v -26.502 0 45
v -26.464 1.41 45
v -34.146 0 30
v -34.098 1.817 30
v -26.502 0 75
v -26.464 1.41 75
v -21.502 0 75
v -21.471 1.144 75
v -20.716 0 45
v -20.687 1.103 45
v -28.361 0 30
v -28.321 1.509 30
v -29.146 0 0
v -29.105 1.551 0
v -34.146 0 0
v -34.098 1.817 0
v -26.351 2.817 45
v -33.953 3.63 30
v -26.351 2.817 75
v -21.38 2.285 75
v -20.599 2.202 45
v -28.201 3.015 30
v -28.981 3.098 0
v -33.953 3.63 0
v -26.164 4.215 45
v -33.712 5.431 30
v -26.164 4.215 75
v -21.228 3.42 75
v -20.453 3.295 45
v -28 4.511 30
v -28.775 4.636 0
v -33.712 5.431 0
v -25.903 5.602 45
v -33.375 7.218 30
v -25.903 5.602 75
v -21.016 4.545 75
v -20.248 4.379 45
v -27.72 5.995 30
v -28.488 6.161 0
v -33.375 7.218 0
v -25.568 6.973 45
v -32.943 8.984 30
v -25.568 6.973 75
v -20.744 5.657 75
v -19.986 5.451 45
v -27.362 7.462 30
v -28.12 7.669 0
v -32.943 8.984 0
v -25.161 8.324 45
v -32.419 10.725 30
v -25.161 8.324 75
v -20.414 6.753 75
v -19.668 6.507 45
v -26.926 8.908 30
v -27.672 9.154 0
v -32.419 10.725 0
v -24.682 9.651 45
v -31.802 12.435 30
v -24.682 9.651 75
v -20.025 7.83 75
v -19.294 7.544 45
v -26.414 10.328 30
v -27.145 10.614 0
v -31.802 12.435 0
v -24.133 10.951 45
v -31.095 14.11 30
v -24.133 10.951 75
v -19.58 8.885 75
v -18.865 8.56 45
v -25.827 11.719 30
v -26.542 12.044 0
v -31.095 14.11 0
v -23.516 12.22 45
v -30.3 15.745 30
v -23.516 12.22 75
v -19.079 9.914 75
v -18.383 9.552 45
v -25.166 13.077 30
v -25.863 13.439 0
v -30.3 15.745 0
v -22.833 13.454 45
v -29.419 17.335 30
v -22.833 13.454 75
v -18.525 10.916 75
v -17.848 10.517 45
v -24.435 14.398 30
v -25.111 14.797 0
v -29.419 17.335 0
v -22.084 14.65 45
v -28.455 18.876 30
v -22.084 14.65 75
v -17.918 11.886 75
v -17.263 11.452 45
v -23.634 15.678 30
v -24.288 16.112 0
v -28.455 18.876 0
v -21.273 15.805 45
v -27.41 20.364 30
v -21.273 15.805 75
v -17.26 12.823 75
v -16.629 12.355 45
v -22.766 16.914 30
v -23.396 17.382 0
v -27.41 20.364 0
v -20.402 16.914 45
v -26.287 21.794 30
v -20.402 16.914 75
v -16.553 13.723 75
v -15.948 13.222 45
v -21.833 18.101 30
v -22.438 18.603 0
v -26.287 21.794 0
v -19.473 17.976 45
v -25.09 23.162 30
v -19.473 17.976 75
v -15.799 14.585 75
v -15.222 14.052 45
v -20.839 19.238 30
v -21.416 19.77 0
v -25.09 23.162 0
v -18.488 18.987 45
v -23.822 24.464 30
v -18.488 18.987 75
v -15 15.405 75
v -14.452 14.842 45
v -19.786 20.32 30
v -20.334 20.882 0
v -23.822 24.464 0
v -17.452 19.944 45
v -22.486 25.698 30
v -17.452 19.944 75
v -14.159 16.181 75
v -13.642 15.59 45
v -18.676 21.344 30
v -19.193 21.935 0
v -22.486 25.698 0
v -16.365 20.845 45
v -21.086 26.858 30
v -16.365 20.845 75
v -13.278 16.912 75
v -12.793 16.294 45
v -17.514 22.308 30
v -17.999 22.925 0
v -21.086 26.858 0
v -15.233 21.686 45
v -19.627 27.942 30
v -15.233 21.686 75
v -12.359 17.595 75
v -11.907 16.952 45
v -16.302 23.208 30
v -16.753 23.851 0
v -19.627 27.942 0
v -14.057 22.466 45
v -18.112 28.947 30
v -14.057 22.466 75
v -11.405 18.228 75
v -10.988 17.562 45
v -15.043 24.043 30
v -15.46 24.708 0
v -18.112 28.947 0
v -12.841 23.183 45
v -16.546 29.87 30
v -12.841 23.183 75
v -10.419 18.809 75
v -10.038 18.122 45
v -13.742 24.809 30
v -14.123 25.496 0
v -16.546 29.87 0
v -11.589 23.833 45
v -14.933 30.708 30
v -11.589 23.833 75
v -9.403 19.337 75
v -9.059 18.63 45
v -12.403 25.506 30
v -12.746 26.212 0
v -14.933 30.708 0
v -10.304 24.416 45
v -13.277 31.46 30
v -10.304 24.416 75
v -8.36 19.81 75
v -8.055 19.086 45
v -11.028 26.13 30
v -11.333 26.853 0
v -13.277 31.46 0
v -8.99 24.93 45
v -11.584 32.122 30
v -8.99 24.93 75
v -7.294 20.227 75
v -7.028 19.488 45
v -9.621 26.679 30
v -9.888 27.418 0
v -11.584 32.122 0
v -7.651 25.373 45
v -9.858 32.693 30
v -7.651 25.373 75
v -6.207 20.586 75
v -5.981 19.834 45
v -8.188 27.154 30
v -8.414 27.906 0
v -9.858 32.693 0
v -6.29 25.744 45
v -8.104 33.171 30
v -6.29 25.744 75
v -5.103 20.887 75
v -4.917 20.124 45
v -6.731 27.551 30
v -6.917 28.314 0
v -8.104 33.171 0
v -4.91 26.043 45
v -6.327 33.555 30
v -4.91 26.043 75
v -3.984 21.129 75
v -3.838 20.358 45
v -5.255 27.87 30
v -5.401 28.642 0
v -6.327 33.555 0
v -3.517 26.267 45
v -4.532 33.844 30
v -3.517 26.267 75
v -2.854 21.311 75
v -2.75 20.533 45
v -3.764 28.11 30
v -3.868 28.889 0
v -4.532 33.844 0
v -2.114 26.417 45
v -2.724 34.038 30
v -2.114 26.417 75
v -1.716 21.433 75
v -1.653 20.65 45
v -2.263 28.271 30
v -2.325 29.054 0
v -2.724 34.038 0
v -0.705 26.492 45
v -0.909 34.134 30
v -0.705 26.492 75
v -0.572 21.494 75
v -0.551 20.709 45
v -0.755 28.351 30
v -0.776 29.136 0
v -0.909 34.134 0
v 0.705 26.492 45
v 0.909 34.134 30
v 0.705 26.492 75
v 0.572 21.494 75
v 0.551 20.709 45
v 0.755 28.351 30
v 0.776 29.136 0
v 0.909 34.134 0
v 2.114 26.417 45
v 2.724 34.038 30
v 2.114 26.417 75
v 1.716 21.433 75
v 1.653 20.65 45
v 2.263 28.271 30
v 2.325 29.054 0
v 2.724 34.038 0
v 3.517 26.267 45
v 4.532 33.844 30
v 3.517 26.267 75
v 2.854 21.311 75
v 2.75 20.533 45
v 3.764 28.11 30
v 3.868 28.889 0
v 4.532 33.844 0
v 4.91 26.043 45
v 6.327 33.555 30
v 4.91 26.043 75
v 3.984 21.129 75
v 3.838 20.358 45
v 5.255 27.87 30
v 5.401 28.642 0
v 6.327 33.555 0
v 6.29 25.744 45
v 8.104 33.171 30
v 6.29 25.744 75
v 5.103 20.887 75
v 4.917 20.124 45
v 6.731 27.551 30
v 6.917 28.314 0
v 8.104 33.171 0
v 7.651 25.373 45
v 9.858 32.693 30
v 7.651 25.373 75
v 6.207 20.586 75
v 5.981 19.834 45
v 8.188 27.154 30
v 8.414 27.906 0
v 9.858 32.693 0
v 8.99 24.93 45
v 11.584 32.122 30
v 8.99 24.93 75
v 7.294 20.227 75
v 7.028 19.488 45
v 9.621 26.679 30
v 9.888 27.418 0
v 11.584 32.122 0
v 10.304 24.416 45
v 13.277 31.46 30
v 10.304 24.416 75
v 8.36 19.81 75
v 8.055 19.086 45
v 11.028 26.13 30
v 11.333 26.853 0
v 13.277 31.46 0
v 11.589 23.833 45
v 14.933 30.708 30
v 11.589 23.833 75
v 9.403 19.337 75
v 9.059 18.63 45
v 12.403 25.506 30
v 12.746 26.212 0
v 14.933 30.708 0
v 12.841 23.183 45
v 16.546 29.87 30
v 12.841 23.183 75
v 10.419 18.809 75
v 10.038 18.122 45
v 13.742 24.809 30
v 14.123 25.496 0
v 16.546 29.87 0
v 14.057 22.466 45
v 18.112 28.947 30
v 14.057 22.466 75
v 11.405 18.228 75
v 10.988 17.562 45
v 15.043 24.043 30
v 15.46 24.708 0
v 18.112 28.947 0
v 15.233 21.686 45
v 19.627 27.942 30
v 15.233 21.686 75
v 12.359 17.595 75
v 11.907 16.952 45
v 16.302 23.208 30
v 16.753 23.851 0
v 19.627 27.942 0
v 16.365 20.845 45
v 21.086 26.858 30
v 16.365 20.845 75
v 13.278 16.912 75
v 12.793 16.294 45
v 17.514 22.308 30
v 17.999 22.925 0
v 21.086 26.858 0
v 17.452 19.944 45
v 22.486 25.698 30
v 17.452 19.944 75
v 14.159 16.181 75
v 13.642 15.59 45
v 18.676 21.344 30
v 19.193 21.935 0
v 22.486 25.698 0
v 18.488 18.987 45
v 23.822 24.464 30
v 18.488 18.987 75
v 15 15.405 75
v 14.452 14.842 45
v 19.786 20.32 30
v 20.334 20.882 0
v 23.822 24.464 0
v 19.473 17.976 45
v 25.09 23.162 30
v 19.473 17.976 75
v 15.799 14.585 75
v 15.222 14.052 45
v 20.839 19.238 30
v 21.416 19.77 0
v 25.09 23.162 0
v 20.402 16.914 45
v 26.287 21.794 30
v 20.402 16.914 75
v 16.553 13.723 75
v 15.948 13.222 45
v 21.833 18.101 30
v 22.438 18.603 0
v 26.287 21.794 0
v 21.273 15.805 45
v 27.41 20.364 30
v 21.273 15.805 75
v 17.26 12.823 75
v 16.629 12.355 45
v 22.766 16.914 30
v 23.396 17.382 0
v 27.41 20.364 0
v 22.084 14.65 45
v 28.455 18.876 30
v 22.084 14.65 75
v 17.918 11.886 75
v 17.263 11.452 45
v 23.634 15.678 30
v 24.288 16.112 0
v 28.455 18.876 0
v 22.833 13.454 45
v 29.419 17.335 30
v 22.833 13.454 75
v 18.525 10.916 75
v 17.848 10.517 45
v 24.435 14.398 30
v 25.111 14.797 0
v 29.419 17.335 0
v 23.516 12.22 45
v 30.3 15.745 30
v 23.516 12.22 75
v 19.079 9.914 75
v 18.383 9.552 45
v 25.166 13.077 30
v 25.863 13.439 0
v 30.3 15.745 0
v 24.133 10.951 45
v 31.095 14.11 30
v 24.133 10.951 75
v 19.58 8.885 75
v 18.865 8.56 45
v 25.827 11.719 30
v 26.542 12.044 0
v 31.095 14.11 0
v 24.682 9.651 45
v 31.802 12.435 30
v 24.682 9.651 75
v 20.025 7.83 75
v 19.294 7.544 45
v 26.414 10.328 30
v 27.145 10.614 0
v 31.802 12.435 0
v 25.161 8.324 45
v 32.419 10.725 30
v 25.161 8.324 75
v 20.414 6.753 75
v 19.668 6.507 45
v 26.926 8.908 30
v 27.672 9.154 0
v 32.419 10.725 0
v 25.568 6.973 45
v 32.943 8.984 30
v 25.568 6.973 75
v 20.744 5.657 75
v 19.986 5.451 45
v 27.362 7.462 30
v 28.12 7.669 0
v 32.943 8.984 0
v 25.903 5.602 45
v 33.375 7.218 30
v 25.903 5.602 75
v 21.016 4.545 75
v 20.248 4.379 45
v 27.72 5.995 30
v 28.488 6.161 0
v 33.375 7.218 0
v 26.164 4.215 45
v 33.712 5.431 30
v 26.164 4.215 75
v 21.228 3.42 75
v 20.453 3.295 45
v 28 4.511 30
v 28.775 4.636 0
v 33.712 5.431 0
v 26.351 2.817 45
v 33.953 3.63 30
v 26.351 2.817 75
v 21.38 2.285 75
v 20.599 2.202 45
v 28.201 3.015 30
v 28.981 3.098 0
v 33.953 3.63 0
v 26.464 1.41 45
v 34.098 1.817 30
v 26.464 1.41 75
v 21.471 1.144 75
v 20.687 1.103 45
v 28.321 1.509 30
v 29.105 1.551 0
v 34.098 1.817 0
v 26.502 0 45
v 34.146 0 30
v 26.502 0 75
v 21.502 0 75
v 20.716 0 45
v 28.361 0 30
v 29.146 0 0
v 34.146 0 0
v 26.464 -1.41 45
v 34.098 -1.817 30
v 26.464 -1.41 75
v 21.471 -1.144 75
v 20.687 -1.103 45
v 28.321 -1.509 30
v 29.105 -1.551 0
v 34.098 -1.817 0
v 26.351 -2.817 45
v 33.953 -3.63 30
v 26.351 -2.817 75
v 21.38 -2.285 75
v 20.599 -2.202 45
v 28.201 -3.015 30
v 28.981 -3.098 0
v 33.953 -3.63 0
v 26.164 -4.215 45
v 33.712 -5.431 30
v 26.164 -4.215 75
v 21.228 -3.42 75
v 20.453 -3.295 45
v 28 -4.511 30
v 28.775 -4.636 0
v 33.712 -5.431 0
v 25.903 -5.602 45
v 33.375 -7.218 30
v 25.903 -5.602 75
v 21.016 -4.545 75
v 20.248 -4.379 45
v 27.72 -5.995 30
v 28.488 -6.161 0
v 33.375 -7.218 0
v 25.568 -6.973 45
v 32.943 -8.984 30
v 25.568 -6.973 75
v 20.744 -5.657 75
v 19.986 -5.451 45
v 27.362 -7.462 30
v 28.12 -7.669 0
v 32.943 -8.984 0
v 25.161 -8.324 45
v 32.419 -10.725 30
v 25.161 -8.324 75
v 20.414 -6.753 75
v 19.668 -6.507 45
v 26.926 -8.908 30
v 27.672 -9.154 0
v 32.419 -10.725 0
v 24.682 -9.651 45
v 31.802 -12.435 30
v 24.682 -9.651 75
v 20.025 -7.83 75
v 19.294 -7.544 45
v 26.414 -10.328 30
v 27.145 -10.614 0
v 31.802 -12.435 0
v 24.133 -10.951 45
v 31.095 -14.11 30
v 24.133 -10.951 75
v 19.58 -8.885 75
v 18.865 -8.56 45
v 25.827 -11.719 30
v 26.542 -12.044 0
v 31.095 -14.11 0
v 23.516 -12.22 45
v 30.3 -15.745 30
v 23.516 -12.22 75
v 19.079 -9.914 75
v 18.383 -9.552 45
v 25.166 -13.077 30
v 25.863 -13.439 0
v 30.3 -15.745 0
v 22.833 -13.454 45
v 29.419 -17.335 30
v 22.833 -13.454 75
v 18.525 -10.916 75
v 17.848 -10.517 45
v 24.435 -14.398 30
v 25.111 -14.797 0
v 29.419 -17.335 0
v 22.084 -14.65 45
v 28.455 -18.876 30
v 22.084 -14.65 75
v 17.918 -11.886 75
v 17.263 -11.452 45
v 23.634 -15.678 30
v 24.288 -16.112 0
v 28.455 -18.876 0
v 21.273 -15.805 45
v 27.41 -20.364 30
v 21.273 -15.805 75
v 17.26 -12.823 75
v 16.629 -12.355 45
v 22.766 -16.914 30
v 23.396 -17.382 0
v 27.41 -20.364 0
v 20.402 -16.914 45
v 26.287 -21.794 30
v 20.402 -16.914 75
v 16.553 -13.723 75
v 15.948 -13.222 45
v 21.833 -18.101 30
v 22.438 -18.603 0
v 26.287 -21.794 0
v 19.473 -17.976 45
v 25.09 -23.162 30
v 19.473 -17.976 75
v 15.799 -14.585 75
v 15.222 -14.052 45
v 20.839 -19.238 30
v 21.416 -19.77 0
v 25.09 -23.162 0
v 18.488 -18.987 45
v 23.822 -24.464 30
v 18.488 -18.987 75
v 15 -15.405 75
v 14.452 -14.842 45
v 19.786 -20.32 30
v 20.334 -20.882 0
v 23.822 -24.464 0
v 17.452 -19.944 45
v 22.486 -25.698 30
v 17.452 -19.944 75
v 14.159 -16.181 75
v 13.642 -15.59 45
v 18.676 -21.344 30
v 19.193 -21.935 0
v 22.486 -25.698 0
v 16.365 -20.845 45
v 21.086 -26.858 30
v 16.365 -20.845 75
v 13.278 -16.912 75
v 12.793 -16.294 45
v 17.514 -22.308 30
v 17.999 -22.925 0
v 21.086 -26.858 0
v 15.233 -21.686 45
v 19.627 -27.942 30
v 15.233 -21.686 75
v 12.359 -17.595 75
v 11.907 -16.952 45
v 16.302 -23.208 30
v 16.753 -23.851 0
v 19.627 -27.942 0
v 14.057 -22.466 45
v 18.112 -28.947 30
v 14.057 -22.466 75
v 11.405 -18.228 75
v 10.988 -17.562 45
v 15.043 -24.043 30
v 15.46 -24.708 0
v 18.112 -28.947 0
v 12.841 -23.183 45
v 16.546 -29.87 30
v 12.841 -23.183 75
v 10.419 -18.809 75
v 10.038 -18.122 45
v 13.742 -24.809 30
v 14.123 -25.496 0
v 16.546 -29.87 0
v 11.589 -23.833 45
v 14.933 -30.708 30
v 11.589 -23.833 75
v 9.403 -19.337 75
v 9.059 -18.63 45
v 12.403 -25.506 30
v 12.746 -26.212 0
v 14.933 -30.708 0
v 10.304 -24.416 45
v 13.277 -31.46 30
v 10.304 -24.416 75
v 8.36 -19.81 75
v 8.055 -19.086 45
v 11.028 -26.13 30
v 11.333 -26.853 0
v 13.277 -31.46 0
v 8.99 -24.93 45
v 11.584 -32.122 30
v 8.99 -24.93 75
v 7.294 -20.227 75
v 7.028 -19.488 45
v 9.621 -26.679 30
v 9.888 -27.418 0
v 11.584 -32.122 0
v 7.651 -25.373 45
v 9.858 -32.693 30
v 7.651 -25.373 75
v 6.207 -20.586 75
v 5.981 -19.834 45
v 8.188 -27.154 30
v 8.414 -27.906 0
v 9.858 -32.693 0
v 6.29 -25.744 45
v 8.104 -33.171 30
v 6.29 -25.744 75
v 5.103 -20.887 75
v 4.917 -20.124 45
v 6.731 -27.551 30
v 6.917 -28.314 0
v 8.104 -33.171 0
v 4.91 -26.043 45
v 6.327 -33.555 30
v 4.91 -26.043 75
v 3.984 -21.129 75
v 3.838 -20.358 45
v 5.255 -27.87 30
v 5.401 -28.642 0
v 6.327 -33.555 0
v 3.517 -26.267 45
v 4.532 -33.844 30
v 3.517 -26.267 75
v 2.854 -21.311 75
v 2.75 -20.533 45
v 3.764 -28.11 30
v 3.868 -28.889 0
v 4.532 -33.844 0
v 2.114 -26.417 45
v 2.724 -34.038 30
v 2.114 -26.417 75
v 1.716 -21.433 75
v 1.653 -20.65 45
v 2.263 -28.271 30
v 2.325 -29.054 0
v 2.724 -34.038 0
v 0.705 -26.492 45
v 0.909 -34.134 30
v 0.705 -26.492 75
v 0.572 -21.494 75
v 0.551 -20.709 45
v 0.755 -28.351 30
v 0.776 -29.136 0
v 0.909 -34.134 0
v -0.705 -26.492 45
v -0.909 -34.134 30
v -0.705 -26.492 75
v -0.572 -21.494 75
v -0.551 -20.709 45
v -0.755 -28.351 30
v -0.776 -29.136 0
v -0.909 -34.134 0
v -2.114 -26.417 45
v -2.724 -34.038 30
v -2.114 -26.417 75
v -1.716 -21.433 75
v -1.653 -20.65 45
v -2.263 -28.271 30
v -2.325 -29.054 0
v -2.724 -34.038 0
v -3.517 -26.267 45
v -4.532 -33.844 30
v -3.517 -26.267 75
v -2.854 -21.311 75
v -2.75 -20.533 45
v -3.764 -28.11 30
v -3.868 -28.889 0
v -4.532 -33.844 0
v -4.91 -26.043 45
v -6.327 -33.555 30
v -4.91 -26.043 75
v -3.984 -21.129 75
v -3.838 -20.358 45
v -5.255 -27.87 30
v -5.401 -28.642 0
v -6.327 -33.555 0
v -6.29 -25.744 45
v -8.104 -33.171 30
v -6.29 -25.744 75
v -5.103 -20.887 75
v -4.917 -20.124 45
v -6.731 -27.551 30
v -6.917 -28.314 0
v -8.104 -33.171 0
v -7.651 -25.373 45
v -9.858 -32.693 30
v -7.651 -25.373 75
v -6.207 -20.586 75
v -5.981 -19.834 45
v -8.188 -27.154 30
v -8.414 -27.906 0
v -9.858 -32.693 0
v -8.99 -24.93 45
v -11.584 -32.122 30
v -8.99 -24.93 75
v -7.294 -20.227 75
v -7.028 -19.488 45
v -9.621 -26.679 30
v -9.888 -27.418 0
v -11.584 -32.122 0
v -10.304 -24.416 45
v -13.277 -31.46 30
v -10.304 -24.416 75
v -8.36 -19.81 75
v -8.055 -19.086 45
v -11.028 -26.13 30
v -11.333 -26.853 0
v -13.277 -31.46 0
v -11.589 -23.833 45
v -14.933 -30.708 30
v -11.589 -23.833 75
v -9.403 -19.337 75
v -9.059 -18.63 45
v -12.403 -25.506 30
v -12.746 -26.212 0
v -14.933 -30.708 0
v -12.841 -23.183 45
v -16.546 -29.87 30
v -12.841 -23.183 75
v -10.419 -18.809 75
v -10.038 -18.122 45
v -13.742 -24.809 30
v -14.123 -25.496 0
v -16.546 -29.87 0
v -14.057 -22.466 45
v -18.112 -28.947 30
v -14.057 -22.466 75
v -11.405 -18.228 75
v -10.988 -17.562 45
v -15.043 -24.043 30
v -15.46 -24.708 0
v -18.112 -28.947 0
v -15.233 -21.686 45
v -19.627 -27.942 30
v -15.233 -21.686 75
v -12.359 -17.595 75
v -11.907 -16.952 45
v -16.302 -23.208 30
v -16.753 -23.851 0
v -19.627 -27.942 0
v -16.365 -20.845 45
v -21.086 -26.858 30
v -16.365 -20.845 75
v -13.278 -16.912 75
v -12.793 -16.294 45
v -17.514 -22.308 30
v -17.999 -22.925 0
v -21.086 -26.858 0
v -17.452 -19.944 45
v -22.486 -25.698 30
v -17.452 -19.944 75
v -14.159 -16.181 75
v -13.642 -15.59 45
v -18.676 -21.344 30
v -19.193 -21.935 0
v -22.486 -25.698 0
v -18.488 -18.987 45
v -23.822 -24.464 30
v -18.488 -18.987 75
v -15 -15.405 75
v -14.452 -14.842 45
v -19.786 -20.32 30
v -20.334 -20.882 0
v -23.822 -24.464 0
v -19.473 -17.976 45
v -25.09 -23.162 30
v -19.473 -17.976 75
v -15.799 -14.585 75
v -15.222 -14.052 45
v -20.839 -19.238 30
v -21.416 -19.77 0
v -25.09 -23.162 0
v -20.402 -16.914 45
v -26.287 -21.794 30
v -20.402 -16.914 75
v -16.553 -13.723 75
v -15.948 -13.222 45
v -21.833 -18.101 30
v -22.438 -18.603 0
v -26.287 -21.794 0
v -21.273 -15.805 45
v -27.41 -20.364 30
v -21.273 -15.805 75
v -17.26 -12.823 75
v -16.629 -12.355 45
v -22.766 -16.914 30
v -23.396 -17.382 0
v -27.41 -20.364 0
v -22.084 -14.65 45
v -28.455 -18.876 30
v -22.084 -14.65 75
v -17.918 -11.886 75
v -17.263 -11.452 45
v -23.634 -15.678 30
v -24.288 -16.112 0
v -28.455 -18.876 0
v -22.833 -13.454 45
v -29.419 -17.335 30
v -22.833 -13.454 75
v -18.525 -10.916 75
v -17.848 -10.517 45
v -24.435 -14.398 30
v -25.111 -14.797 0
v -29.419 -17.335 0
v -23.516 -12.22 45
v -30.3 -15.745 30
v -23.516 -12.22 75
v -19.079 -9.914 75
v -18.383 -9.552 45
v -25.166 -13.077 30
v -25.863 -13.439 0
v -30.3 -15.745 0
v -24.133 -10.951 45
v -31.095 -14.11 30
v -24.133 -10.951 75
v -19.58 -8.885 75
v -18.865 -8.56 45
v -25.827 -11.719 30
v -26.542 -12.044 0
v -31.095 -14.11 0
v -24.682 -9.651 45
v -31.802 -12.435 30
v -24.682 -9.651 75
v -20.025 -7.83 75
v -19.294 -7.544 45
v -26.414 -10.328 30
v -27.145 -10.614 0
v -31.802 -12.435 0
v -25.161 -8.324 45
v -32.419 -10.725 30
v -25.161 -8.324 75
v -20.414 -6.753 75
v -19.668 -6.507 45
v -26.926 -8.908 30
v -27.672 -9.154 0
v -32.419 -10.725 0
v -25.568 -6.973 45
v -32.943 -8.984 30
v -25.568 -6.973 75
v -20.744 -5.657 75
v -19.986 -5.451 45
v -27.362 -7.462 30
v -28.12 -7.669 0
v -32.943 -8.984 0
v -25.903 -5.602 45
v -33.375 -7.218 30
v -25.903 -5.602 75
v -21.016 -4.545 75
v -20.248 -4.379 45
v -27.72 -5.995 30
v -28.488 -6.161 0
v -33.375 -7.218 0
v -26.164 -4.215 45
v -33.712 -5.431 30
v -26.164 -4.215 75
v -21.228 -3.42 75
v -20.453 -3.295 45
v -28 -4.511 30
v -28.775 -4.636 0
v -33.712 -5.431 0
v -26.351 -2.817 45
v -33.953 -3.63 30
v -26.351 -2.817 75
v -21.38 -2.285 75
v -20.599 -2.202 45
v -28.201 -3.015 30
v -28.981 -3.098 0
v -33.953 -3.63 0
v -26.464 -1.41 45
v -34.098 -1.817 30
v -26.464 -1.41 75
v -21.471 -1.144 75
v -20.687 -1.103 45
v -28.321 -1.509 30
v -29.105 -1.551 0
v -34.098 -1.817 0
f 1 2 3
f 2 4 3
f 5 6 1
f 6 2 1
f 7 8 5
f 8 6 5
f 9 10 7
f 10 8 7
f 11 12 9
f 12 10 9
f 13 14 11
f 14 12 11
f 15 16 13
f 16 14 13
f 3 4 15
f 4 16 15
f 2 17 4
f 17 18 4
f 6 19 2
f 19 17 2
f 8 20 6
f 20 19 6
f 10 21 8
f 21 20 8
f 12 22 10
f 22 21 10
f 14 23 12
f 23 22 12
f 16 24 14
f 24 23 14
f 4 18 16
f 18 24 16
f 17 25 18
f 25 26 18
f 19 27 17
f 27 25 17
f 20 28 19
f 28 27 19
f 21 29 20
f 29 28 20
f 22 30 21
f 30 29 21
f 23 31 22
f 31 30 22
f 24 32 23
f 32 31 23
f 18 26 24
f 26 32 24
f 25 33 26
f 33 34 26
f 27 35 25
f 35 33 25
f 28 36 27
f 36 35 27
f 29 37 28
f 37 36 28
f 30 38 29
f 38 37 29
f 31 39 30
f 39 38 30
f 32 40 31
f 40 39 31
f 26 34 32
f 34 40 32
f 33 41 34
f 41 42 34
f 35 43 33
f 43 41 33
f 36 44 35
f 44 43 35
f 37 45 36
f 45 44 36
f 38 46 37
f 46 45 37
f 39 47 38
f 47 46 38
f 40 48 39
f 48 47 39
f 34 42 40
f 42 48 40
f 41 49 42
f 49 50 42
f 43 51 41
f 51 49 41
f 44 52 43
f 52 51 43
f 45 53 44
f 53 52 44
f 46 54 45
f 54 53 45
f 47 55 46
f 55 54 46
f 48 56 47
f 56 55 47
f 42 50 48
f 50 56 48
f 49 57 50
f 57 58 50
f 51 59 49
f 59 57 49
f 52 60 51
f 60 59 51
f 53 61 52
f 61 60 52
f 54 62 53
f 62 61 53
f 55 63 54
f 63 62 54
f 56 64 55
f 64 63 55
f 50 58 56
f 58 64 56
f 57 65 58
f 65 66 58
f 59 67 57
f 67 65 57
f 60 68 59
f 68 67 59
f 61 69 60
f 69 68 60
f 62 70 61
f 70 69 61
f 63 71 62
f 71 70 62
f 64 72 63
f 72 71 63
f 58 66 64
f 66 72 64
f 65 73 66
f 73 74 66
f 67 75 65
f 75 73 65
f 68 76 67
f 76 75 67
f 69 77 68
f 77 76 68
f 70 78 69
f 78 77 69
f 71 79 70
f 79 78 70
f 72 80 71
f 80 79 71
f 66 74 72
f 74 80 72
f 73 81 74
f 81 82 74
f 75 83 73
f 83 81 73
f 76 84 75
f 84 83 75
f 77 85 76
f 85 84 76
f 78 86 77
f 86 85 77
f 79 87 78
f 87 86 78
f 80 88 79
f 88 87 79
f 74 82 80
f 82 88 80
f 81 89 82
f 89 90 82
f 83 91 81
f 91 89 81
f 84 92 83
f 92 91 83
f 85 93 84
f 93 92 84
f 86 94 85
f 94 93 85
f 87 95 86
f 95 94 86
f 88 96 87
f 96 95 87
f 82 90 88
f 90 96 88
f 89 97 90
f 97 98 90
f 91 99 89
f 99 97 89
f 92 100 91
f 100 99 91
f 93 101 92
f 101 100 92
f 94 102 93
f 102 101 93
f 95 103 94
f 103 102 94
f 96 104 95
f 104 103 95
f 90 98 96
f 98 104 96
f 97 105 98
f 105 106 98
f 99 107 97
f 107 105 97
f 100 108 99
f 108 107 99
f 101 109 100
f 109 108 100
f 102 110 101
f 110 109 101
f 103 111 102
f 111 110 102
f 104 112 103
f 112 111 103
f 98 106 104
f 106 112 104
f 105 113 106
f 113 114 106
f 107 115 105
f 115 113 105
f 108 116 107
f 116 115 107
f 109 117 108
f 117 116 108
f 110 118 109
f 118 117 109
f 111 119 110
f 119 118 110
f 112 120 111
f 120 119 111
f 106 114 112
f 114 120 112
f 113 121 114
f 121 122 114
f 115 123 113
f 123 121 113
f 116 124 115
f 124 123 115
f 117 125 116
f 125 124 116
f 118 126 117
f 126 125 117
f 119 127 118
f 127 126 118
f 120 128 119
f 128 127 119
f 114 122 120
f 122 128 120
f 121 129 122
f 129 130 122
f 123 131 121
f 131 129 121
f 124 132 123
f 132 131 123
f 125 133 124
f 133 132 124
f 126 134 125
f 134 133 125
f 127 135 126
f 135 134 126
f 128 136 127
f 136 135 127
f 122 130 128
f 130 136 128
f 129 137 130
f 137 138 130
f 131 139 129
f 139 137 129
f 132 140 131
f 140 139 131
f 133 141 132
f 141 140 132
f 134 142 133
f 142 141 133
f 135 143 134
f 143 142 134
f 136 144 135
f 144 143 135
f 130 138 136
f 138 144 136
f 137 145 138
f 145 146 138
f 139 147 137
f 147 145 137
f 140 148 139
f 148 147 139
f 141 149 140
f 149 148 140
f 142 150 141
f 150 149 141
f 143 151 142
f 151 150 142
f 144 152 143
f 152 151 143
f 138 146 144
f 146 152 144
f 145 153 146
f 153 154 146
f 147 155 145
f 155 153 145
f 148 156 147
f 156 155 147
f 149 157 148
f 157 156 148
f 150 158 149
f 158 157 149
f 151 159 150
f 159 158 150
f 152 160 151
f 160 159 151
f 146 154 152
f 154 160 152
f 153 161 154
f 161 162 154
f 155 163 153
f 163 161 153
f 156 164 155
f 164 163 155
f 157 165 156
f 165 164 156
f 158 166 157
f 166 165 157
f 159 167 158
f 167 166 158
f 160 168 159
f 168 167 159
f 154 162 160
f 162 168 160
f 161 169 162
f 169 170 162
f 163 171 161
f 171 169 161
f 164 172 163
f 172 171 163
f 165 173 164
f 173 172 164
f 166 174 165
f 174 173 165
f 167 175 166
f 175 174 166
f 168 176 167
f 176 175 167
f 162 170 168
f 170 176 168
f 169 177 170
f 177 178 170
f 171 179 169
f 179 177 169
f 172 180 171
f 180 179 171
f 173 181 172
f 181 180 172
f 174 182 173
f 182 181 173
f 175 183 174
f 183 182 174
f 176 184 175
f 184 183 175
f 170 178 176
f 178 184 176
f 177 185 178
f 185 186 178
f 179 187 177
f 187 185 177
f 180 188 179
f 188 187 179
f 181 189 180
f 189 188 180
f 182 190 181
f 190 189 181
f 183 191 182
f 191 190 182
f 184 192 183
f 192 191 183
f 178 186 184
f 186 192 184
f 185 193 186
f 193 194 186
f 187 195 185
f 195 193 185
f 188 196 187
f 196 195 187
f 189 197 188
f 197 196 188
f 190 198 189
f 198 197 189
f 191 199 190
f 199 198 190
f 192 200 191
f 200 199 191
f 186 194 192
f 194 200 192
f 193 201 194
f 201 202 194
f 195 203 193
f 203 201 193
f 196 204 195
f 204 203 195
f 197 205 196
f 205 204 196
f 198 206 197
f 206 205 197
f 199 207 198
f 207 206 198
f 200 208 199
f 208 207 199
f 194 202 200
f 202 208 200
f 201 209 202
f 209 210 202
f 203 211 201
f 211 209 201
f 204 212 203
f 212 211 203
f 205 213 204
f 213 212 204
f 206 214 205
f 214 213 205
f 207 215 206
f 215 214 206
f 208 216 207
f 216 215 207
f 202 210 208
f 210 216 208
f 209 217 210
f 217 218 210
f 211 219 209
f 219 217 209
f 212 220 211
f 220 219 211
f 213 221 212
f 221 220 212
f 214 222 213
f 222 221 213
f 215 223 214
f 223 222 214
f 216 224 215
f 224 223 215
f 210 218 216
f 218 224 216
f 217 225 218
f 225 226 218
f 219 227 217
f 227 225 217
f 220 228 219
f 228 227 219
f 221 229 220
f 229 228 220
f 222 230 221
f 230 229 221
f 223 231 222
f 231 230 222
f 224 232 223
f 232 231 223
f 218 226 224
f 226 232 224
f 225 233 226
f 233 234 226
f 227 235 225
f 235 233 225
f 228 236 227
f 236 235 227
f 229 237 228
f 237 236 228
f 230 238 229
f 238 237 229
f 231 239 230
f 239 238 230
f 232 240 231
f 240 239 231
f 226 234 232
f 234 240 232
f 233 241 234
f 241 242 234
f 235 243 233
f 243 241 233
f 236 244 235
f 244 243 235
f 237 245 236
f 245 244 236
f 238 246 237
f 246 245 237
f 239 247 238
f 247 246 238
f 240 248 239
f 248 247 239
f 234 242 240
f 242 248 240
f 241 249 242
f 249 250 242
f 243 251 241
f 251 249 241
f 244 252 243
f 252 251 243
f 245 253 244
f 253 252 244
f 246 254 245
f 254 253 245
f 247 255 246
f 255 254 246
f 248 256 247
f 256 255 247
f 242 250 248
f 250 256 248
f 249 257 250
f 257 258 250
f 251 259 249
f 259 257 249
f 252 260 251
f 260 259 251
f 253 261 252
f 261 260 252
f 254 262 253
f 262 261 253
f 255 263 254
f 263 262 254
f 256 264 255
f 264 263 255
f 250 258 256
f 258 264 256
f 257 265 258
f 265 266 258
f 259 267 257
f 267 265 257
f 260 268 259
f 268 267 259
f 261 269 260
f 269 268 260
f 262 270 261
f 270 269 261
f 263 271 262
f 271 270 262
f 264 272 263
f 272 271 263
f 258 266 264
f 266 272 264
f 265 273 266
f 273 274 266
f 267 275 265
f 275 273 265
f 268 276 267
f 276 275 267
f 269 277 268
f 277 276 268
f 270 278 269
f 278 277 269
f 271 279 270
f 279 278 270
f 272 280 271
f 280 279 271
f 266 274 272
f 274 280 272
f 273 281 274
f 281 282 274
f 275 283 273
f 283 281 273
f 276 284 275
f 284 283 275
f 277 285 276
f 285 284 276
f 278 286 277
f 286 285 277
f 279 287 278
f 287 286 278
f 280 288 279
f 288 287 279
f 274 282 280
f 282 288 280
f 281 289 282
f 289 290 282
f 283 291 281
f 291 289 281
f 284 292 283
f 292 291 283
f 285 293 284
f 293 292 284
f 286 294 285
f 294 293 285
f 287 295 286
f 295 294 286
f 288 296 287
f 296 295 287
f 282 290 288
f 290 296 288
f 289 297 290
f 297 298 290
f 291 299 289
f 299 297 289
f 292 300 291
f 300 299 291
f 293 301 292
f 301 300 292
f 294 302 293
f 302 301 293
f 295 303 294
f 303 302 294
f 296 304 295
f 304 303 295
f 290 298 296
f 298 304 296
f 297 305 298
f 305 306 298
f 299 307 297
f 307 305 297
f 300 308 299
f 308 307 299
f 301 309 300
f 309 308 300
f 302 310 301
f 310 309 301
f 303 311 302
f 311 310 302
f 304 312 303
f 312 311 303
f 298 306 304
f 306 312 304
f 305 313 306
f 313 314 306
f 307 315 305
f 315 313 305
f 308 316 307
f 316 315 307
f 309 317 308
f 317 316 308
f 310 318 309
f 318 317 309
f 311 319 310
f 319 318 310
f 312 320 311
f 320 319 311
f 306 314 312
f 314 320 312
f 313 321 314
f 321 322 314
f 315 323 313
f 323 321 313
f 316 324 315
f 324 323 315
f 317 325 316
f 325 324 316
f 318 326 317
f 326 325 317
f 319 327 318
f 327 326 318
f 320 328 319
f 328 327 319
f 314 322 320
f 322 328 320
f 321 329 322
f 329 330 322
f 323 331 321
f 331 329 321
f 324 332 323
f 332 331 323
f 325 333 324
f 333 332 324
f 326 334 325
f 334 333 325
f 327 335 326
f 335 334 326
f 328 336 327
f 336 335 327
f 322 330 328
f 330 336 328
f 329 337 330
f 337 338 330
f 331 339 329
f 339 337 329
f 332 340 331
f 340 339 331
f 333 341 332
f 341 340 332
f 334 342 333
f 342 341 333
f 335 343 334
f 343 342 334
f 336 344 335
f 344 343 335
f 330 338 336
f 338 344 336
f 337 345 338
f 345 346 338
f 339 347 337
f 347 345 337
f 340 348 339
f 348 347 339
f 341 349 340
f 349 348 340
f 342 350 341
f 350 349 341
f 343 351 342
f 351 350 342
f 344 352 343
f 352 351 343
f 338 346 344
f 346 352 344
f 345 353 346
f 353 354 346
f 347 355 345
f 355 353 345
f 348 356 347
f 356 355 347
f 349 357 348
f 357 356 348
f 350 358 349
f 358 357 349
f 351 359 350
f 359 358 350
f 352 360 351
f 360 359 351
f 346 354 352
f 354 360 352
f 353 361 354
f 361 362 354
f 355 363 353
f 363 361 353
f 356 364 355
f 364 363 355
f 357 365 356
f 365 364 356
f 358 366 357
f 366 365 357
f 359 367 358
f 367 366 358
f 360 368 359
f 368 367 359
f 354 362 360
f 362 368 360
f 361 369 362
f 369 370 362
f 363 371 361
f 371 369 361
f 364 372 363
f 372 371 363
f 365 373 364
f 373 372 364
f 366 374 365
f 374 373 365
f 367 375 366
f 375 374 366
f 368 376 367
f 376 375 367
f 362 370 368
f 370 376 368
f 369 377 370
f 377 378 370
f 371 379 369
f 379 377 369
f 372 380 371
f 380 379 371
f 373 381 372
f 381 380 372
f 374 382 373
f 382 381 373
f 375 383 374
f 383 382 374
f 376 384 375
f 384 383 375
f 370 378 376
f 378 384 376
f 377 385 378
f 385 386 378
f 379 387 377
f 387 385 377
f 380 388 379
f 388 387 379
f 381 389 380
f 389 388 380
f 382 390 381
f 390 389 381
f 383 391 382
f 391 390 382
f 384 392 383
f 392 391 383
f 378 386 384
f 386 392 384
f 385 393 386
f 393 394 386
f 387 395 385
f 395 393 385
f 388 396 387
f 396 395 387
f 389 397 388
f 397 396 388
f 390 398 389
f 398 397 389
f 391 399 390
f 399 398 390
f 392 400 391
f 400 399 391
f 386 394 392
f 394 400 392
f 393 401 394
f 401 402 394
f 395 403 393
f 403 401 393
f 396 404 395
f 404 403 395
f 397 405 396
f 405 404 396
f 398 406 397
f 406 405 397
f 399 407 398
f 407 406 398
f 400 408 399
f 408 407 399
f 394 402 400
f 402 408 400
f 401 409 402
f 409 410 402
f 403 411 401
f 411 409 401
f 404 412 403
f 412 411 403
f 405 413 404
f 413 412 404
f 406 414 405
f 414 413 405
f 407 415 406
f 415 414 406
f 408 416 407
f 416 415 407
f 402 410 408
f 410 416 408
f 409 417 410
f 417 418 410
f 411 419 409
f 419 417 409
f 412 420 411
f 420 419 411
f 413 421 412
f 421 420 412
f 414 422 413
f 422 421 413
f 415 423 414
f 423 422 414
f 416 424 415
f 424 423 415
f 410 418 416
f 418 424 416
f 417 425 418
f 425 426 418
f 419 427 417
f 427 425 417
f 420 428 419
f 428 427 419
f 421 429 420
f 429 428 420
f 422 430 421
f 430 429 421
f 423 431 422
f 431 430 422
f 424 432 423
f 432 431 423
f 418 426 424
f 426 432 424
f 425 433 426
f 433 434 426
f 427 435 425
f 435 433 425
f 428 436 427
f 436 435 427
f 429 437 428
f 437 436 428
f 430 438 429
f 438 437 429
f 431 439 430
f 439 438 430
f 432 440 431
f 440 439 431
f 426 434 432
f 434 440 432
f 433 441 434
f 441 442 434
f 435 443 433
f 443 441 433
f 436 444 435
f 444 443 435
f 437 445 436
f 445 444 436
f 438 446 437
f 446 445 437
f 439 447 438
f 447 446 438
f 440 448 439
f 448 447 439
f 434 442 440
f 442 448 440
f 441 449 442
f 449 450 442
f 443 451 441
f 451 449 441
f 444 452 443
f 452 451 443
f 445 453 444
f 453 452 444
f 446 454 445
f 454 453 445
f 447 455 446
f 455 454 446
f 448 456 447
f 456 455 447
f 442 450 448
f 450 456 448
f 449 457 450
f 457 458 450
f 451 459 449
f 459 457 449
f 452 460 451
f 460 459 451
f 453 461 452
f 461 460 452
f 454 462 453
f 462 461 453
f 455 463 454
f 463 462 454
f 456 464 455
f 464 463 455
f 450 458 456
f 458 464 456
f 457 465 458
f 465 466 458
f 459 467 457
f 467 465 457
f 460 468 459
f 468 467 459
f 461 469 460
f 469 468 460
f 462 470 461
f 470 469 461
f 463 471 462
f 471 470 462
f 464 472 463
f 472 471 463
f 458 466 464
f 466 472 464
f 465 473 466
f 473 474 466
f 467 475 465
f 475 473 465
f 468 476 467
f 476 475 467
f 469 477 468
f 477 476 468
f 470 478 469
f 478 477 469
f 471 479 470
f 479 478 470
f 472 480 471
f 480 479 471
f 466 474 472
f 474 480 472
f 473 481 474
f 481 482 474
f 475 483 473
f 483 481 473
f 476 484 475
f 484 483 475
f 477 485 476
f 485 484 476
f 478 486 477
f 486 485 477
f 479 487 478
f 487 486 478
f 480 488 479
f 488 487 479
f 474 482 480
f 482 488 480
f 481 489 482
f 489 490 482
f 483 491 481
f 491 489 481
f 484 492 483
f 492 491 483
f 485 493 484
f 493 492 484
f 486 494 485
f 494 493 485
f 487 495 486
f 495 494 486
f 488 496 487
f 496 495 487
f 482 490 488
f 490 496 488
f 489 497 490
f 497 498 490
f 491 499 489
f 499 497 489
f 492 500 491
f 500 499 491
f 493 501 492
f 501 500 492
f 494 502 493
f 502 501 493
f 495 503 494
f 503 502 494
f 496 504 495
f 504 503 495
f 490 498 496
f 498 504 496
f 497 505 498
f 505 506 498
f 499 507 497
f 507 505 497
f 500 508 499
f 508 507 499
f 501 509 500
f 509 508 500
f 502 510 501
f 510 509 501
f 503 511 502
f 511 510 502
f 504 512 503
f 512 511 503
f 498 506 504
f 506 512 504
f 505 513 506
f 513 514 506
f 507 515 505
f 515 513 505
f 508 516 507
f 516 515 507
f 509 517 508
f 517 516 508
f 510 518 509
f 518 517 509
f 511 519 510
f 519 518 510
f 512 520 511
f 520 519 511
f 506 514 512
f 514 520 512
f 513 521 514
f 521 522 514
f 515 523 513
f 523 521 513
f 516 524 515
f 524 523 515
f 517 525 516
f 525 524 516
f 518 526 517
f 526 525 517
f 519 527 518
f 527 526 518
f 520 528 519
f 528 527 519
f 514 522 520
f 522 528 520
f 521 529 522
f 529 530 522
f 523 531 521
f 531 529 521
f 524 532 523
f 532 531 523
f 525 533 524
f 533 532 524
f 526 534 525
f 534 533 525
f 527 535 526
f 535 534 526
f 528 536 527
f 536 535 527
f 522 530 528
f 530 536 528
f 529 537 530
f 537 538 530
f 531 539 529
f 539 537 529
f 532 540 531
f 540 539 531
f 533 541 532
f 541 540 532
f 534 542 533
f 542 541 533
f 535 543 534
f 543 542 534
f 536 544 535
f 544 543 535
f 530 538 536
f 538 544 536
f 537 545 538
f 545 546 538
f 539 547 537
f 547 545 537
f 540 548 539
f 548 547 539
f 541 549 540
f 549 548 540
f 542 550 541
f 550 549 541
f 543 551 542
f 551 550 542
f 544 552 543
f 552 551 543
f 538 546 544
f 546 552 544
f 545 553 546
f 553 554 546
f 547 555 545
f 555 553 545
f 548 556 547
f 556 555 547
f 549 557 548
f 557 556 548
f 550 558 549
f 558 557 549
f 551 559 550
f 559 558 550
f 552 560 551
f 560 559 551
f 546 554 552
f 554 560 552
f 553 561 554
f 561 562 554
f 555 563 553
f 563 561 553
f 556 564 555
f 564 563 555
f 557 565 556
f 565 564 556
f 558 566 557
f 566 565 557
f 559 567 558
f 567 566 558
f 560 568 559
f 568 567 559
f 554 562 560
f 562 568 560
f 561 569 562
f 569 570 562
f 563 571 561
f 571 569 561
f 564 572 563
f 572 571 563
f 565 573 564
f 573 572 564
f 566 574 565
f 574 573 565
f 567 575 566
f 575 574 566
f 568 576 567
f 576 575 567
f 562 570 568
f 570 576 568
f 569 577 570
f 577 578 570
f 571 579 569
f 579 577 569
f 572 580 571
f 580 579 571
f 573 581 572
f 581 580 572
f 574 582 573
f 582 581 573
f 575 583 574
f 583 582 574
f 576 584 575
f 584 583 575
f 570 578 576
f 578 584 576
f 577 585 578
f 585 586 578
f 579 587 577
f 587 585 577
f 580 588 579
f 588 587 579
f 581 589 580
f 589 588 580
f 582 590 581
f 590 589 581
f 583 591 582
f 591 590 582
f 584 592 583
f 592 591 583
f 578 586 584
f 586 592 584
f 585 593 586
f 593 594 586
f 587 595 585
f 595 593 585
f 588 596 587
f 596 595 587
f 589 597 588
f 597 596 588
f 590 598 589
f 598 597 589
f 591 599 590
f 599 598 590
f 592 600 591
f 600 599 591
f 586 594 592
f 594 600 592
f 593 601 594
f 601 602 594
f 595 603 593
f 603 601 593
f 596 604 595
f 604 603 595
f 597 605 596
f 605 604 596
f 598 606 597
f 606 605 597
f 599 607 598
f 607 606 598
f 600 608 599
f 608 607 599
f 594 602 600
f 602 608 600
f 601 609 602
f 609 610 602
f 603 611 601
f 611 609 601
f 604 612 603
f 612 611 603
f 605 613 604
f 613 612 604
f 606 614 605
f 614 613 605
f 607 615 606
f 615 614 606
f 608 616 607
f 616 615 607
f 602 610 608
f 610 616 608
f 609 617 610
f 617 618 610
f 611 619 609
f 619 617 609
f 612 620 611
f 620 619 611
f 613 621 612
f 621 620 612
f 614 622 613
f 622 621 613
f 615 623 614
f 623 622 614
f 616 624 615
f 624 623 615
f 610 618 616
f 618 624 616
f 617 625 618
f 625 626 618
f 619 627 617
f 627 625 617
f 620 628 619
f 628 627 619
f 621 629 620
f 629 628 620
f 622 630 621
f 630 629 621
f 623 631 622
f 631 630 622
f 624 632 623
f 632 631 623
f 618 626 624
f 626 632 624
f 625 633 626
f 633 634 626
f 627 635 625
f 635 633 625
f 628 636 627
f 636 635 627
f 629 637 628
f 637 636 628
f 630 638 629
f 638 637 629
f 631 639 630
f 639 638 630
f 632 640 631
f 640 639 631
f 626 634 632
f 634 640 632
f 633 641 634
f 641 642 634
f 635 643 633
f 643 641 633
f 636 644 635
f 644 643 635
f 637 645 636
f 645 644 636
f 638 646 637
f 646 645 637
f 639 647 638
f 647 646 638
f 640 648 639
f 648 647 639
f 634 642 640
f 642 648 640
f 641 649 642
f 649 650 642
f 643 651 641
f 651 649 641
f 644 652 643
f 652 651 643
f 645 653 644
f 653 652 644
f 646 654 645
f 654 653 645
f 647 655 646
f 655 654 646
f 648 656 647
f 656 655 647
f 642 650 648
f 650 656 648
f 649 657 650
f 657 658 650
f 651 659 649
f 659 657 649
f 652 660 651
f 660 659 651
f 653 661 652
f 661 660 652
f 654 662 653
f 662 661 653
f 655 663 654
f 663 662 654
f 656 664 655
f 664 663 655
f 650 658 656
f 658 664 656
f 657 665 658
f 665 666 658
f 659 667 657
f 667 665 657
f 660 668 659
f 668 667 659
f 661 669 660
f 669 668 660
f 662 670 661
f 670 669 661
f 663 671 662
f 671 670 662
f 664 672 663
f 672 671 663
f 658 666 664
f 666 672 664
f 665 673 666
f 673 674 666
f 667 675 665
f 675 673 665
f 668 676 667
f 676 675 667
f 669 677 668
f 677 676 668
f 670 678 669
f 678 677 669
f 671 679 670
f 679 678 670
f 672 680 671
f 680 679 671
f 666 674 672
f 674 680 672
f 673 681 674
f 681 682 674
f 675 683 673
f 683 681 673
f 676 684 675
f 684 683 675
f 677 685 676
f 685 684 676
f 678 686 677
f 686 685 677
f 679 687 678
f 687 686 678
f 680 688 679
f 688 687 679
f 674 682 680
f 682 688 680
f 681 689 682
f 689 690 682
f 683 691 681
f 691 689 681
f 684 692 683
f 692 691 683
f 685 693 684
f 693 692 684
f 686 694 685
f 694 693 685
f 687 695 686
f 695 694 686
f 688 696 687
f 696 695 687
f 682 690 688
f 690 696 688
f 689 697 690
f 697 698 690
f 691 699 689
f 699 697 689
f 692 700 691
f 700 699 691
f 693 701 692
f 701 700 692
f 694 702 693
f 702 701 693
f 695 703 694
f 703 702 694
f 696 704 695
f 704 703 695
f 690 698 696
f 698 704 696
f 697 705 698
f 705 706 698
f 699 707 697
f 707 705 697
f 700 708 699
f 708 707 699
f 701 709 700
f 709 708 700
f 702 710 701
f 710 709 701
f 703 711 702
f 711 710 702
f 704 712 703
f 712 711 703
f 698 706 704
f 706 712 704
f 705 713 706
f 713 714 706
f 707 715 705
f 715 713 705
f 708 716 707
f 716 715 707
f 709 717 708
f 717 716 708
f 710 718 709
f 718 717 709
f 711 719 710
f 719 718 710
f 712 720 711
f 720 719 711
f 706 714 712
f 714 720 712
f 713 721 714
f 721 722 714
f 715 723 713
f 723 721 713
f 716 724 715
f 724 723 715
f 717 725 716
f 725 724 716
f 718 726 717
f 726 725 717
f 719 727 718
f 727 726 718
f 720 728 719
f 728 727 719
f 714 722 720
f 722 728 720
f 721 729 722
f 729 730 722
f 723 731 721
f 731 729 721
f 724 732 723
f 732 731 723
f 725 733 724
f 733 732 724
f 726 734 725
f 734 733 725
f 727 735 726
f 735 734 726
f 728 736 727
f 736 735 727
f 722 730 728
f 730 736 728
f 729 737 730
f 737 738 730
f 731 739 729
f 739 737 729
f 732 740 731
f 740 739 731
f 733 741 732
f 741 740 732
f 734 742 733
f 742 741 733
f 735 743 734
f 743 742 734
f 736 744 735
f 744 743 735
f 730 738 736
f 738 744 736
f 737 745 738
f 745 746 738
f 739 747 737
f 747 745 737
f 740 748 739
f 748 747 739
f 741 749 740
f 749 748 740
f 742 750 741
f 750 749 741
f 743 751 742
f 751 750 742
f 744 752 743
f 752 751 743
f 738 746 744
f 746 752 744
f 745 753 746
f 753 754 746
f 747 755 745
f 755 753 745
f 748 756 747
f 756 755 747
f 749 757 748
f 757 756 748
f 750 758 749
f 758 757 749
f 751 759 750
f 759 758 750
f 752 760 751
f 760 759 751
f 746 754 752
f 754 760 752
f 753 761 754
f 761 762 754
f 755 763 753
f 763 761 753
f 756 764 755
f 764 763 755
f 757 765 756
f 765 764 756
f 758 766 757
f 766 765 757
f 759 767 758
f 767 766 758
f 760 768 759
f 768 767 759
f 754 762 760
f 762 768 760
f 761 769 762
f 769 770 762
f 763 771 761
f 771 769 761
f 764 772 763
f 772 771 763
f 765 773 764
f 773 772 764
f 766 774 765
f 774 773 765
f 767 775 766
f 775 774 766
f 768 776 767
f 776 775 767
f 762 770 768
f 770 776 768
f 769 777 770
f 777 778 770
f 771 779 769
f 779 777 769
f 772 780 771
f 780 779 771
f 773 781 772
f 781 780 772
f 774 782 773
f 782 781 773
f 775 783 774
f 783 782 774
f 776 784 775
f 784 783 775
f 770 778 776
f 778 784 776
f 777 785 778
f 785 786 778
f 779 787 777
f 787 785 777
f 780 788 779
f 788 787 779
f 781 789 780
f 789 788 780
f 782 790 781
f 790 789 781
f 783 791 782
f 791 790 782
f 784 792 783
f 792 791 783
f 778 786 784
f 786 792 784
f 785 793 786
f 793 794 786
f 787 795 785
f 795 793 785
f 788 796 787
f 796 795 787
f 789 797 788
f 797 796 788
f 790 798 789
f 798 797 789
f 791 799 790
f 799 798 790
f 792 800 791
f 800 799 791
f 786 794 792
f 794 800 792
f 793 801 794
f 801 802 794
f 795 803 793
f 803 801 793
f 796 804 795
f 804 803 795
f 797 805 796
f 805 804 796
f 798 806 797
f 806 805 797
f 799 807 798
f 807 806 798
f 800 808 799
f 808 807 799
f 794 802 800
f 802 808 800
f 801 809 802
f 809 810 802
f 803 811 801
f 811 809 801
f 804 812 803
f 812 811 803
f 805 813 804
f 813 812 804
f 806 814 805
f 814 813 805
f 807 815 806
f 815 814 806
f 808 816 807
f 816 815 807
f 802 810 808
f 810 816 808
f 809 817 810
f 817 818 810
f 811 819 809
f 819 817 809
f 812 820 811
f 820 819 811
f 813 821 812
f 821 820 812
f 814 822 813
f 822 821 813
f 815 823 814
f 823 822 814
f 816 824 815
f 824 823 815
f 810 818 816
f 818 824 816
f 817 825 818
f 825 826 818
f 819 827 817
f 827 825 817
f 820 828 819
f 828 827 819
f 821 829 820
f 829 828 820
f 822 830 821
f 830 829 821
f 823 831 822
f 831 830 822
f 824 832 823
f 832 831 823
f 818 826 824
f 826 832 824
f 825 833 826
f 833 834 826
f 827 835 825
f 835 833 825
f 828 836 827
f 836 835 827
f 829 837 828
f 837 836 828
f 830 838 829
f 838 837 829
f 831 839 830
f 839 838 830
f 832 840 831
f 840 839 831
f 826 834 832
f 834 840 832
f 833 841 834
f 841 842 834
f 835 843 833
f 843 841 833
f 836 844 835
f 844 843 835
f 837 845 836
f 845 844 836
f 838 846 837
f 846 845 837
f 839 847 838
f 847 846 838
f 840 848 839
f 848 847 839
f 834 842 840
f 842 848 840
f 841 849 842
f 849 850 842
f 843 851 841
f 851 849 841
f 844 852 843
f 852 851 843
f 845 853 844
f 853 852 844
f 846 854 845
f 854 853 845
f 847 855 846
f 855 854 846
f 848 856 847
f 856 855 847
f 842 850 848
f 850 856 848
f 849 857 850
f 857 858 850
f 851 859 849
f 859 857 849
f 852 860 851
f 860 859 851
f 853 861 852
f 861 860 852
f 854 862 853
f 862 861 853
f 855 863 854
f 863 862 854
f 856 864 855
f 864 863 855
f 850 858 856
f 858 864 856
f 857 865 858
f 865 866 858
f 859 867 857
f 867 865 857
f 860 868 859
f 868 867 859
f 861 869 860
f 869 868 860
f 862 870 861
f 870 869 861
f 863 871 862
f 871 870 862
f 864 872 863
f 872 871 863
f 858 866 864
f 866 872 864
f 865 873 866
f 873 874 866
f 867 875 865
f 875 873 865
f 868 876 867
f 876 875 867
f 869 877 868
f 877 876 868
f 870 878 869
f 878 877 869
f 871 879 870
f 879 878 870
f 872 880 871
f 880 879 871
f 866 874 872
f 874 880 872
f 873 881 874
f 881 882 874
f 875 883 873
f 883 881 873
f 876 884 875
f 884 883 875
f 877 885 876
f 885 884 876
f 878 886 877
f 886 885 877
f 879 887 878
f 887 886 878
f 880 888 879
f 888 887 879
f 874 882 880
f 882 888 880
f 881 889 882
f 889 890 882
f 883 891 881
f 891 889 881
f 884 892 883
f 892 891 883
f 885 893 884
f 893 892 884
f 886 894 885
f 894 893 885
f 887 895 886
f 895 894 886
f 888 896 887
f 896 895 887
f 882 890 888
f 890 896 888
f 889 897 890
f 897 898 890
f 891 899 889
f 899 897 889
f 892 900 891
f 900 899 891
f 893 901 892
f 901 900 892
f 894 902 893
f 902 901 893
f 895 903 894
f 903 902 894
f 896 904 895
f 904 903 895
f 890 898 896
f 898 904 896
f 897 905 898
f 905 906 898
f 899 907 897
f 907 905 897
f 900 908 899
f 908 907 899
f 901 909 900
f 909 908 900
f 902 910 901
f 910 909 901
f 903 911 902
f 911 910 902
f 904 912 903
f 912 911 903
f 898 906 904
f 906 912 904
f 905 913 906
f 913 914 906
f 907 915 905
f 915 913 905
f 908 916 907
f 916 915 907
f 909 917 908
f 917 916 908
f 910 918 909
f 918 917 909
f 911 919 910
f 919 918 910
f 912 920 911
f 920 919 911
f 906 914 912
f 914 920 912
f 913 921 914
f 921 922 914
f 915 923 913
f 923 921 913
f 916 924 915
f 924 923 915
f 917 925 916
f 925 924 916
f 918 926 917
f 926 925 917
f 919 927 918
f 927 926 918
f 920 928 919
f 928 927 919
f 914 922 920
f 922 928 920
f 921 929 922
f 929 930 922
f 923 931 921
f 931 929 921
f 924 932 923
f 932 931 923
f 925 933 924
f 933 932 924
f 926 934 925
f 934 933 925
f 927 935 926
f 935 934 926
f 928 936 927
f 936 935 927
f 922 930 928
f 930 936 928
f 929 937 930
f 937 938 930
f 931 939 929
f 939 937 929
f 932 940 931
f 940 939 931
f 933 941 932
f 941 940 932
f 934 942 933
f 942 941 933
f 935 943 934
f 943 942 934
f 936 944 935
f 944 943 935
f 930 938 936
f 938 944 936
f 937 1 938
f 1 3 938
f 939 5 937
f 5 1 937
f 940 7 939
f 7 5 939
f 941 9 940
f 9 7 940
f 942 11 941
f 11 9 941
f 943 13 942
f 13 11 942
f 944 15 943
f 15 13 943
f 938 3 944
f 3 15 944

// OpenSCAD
//------------------------------------------------------------------
/*

Adapters for connecting a tool to a dust collector.

*/
//------------------------------------------------------------------
// Basic parameters

// Note: The adapter fits around the outside diameter of the pipes on the
// tool and the vaccuum.

// Specify the outside diameter of the pipes to be fitted:
diameter_1 = 57.15; // mm
diameter_2 = 42.16; // mm

// Specify the length of the adapter at the respective diameters:
length_1 = 30; // mm
length_2 = 30; // mm

// Specify the transition length between the diameters:
// (A longer transition will reduce the overhang angle)
transition_length = 15; // mm

// Specify the wall thickness:
wall_thickness = 5; // mm

// The ID of the adapter will be larger than the OD of the fitted
// pipe by this clearance factor:
clearance = 1.02; // no unit

// An internal taper in the adapter will allow a push fit:
taper = 1.5; // degrees

//------------------------------------------------------------------
// control the number of facets on cylinders

facet_epsilon = 0.01;
function facets(r) = 180 / acos(1 - (facet_epsilon / r));

//------------------------------------------------------------------
// derived values

r1 = diameter_1 / 2;
r2 = diameter_2 / 2;

//------------------------------------------------------------------

module adapter_wall() {

  ir1 = r1 * clearance;
  ir2 = r2 * clearance;
  or1 = ir1 + wall_thickness;
  or2 = ir2 + wall_thickness;
  t1 = length_1 * sin(taper);
  t2 = length_2 * sin(taper);

  points = [
    [ir1,0],
    [or1, 0],
    [or1, length_1],
    [or2, length_1 + transition_length],
    [or2, length_1 + transition_length + length_2],
    [ir2, length_1 + transition_length + length_2],
    [ir2 - t2, length_1 + transition_length],
    [ir1 - t1, length_1],
  ];
  polygon(points=points, convexity = 2);
}

//------------------------------------------------------------------

module adapter() {
  overhang_angle = atan2(transition_length, abs(r2 - r1));
  echo("overhang angle is ", overhang_angle, "degrees");
  rotate_extrude(angle = 360, $fn = facets(r1)) {
    adapter_wall();
  }
}

adapter();

//------------------------------------------------------------------
